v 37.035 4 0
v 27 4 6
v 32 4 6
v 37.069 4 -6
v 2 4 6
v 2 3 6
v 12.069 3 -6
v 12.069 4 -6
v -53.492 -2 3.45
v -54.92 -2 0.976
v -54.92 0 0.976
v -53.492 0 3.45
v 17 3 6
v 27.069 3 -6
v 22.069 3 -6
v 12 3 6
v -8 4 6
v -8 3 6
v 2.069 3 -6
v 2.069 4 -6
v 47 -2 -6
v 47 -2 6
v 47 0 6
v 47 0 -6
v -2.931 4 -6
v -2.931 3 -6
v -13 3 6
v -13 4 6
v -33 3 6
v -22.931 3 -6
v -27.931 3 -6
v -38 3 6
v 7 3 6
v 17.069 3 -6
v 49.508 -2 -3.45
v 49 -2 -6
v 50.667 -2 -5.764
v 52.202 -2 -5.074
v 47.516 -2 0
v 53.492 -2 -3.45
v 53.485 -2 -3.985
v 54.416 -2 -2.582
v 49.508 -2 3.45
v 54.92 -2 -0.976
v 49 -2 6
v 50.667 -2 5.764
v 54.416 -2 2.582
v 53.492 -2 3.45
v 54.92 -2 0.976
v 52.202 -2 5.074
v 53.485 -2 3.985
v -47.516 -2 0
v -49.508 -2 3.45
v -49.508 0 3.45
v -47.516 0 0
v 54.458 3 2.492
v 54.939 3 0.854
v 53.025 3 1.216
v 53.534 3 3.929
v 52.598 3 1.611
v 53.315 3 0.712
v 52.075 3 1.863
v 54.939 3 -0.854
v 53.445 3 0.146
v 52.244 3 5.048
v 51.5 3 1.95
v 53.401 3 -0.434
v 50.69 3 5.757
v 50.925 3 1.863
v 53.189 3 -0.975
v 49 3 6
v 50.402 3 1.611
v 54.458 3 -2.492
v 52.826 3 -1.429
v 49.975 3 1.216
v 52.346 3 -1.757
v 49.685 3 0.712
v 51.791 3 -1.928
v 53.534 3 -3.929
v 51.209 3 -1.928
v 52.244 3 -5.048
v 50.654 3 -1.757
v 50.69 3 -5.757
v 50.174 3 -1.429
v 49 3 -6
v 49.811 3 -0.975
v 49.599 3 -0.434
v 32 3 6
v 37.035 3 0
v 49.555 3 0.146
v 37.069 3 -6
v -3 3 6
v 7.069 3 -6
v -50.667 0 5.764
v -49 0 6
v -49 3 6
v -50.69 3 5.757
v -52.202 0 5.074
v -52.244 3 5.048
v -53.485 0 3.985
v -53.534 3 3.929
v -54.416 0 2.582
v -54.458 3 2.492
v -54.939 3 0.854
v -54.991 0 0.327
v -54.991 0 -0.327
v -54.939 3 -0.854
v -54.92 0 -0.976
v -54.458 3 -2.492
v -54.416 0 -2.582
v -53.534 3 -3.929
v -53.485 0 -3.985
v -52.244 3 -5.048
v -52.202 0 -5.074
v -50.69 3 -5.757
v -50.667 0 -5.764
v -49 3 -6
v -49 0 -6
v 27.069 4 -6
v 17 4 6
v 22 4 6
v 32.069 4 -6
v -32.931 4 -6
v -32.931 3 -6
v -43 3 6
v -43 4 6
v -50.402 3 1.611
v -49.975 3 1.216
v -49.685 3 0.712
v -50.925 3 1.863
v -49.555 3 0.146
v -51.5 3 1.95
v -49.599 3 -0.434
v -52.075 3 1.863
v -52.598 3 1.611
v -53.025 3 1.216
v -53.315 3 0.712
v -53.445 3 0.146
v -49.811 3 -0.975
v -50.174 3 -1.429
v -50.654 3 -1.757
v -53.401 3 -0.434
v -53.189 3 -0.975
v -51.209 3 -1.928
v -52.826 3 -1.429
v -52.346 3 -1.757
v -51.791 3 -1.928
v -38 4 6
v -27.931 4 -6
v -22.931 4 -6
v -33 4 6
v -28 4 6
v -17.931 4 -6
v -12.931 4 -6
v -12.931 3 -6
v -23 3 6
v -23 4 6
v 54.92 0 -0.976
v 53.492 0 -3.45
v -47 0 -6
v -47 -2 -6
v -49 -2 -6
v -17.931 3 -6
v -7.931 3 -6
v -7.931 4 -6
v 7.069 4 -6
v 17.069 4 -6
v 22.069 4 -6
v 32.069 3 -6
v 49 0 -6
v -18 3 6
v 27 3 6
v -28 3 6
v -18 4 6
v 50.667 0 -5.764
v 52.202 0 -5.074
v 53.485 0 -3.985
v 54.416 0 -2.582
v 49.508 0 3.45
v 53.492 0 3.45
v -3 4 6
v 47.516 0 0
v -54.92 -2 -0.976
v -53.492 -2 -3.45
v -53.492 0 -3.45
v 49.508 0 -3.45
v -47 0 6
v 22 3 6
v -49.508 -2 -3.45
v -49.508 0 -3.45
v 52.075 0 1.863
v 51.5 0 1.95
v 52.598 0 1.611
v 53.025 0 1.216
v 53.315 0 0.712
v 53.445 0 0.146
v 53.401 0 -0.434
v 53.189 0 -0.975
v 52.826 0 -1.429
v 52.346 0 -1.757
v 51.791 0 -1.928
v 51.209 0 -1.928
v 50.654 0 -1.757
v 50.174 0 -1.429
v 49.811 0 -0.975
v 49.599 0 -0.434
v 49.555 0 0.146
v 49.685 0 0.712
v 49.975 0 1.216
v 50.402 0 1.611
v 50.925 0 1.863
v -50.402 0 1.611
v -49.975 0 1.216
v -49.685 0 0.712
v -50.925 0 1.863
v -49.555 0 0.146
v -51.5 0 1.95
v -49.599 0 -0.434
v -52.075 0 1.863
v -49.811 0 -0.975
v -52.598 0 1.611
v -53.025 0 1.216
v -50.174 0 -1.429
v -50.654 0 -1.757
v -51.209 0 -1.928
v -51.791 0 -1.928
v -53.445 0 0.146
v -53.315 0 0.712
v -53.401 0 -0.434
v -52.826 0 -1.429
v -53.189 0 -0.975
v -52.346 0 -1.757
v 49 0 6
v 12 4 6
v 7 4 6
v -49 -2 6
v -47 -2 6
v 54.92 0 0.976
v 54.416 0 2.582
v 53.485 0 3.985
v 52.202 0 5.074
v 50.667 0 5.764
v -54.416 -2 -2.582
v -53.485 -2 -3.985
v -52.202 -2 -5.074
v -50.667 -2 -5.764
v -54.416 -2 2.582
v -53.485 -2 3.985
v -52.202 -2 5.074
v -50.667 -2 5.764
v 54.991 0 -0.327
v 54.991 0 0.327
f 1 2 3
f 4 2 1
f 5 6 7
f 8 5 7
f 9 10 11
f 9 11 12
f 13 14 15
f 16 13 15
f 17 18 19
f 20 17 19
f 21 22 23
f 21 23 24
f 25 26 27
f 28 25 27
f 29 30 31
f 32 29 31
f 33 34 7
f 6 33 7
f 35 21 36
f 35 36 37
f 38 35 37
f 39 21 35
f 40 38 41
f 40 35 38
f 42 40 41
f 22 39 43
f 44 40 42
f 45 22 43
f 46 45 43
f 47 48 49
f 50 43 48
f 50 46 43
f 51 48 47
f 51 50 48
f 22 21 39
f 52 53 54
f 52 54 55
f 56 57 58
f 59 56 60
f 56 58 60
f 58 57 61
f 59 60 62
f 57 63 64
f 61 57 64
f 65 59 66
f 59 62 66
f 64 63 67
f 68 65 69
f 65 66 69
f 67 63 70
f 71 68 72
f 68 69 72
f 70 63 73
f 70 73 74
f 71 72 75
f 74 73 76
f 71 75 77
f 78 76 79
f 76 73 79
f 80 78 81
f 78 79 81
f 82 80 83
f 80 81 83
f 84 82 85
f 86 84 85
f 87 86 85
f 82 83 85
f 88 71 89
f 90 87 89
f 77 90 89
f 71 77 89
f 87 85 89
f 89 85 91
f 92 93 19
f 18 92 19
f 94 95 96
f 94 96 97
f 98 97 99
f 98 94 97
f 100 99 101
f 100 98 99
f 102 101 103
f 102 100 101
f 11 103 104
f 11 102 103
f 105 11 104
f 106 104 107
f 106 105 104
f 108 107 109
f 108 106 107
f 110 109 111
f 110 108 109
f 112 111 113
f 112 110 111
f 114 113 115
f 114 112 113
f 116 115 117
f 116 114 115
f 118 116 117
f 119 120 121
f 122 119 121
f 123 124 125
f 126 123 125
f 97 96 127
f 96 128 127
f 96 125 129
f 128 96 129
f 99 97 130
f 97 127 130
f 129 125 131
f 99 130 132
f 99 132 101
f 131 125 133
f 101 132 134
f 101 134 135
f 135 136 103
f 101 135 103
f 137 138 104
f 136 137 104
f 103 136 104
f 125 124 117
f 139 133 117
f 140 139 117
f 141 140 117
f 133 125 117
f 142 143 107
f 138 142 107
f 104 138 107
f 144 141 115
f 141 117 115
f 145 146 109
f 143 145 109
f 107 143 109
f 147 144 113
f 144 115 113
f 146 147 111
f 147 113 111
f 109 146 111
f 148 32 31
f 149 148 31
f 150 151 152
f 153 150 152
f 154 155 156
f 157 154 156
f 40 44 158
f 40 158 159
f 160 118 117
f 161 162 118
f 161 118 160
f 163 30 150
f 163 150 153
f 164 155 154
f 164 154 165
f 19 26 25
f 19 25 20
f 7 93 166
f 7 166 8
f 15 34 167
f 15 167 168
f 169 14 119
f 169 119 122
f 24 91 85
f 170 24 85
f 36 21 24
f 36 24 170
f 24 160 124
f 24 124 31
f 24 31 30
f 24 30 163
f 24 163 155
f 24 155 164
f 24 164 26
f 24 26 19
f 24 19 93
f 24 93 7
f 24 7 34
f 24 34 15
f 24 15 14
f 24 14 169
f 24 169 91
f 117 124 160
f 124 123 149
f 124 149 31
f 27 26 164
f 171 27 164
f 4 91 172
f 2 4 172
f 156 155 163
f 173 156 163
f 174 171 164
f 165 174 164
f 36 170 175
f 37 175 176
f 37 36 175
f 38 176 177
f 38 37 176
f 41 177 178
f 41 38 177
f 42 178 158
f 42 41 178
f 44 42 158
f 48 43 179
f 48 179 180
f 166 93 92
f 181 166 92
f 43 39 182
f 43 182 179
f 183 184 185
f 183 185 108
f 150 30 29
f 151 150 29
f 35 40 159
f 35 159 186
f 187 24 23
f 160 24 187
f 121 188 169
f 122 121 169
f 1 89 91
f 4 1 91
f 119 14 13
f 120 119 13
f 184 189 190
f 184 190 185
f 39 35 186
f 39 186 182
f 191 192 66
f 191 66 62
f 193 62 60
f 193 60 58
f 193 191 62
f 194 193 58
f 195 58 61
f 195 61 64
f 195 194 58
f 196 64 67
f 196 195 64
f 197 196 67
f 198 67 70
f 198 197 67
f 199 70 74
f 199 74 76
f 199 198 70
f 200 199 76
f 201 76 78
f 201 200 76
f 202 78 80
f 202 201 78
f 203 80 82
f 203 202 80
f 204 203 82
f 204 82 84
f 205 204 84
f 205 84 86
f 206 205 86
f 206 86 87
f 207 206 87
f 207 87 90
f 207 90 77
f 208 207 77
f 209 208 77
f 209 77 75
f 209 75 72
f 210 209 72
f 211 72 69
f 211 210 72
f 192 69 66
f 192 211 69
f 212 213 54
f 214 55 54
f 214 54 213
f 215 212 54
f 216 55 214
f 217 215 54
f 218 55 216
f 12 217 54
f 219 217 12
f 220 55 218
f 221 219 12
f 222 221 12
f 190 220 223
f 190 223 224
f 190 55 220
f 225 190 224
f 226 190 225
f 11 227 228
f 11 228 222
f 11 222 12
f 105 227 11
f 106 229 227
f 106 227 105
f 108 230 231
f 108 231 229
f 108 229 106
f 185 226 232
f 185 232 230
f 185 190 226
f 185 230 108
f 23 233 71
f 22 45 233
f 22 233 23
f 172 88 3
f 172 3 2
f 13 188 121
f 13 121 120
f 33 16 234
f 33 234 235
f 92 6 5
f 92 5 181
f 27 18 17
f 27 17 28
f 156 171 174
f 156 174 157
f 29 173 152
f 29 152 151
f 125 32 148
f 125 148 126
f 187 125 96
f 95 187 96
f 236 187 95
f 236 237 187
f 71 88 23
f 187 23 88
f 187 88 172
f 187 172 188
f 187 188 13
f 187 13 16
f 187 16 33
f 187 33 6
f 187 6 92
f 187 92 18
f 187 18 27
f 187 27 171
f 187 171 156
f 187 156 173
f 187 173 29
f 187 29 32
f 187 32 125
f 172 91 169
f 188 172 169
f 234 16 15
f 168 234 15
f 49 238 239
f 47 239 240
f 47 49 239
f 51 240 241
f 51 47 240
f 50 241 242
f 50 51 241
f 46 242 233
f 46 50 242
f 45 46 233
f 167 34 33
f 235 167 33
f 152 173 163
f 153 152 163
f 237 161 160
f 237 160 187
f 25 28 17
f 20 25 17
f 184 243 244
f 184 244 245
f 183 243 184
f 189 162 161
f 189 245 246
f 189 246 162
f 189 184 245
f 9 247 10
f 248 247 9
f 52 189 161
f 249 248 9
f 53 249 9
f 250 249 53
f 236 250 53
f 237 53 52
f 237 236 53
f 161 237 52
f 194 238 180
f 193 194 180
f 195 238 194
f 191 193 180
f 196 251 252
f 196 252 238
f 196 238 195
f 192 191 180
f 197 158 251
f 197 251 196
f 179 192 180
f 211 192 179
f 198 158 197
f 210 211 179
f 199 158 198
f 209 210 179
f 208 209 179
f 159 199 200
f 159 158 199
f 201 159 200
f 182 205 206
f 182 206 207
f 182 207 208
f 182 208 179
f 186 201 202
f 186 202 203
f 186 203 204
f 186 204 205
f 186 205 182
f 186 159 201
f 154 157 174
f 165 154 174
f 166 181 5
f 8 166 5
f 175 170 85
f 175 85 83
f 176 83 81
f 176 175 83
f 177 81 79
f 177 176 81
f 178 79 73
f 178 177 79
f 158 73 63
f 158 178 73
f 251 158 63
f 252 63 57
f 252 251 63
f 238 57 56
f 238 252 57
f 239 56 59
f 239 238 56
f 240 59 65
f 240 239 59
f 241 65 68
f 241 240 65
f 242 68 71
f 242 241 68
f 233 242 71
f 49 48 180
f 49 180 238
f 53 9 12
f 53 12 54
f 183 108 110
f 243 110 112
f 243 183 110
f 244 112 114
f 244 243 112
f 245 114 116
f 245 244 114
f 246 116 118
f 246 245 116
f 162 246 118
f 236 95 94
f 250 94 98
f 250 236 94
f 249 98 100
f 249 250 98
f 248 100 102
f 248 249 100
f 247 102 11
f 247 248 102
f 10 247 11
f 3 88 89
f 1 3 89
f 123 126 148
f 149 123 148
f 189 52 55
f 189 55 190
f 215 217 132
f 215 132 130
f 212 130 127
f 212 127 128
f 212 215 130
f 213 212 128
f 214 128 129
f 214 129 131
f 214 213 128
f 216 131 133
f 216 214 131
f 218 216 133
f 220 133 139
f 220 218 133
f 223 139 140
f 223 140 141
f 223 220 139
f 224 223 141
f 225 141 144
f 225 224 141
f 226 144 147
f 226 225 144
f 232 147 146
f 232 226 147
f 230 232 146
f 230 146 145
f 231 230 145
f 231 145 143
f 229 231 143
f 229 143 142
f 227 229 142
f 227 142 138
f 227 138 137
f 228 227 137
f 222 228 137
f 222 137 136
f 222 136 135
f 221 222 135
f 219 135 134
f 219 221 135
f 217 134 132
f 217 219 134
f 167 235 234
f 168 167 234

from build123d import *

# Parameters (mm, degrees)
SKETCH1_R           = 1.95
BOSS_EXTRUDE1_DEPTH = 3
BOSS_EXTRUDE2_START = 2
BOSS_EXTRUDE2_DEPTH = 2
BOSS_EXTRUDE3_DEPTH = 1


with BuildPart() as part:
    # Sketch1 → Boss-Extrude1 (new body)
    with BuildSketch(Plane(origin=(0, 0, 0), x_dir=(1, 0, 0), z_dir=(0, 1, 0))):
        with BuildLine():
            Line((-49, 6), (49, 6))
            ThreePointArc((49, 6), (55, 0), (49, -6))
            Line((49, -6), (-49, -6))
            ThreePointArc((-49, -6), (-55, 0), (-49, 6))
        make_face()
        with Locations(Location((-51.5, 0, 0), (0, 0, 270))):
            Circle(SKETCH1_R, mode=Mode.SUBTRACT)
        with Locations(Location((51.5, 0, 0), (0, 0, 270))):
            Circle(SKETCH1_R, mode=Mode.SUBTRACT)
    extrude(amount=BOSS_EXTRUDE1_DEPTH)

    # Sketch2 → Boss-Extrude2 (add)
    with BuildSketch(Plane.XZ.offset(BOSS_EXTRUDE2_START)):
        with BuildLine():
            Line((54.920031913, -0.976330963), (53.491858429, -3.45))
            Line((53.491858429, -3.45), (49.508141571, -3.45))
            Line((49.508141571, -3.45), (47.516283143, 0))
            Line((47.516283143, 0), (49.508141571, 3.45))
            Line((49.508141571, 3.45), (53.491858429, 3.45))
            Line((53.491858429, 3.45), (54.920031913, 0.976330963))
            ThreePointArc((54.920031913, 0.976330963), (52.882139502, 4.574821624), (49, 6))
            Line((49, 6), (47, 6))
            Line((47, 6), (47, -6))
            Line((47, -6), (49, -6))
            ThreePointArc((49, -6), (52.882139502, -4.574821624), (54.920031913, -0.976330963))
        make_face()
        with BuildLine():
            Line((-49, -6), (-47, -6))
            Line((-47, -6), (-47, 6))
            Line((-47, 6), (-49, 6))
            ThreePointArc((-49, 6), (-52.882139502, 4.574821624), (-54.920031913, 0.976330963))
            Line((-54.920031913, 0.976330963), (-53.491858429, 3.45))
            Line((-53.491858429, 3.45), (-49.508141571, 3.45))
            Line((-49.508141571, 3.45), (-47.516283143, 0))
            Line((-47.516283143, 0), (-49.508141571, -3.45))
            Line((-49.508141571, -3.45), (-53.491858429, -3.45))
            Line((-53.491858429, -3.45), (-54.920031913, -0.976330963))
            ThreePointArc((-54.920031913, -0.976330963), (-52.882139502, -4.574821624), (-49, -6))
        make_face()
    extrude(amount=-BOSS_EXTRUDE2_DEPTH)

    # Sketch3 → Boss-Extrude3 (add)
    with BuildSketch(Plane(origin=(0, 3, 0), x_dir=(1, 0, 0), z_dir=(0, 1, 0))):
        Polygon((-32.930804426, 6), (-43, -6), (-38, -6), (-27.930804426, 6), align=None)
        Polygon((-17.930804426, 6), (-22.930804426, 6), (-33, -6), (-28, -6), align=None)
        Polygon((-7.930804426, 6), (-12.930804426, 6), (-23, -6), (-18, -6), align=None)
        Polygon((2.069195574, 6), (-2.930804426, 6), (-13, -6), (-8, -6), align=None)
        Polygon((12.069195574, 6), (7.069195574, 6), (-3, -6), (2, -6), align=None)
        Polygon((22.069195574, 6), (17.069195574, 6), (7, -6), (12, -6), align=None)
        Polygon((32.069195574, 6), (27.069195574, 6), (17, -6), (22, -6), align=None)
        Polygon((37.069195574, 6), (27, -6), (32, -6), (37.034597787, 0), align=None)
    extrude(amount=BOSS_EXTRUDE3_DEPTH)


solid = part.part
